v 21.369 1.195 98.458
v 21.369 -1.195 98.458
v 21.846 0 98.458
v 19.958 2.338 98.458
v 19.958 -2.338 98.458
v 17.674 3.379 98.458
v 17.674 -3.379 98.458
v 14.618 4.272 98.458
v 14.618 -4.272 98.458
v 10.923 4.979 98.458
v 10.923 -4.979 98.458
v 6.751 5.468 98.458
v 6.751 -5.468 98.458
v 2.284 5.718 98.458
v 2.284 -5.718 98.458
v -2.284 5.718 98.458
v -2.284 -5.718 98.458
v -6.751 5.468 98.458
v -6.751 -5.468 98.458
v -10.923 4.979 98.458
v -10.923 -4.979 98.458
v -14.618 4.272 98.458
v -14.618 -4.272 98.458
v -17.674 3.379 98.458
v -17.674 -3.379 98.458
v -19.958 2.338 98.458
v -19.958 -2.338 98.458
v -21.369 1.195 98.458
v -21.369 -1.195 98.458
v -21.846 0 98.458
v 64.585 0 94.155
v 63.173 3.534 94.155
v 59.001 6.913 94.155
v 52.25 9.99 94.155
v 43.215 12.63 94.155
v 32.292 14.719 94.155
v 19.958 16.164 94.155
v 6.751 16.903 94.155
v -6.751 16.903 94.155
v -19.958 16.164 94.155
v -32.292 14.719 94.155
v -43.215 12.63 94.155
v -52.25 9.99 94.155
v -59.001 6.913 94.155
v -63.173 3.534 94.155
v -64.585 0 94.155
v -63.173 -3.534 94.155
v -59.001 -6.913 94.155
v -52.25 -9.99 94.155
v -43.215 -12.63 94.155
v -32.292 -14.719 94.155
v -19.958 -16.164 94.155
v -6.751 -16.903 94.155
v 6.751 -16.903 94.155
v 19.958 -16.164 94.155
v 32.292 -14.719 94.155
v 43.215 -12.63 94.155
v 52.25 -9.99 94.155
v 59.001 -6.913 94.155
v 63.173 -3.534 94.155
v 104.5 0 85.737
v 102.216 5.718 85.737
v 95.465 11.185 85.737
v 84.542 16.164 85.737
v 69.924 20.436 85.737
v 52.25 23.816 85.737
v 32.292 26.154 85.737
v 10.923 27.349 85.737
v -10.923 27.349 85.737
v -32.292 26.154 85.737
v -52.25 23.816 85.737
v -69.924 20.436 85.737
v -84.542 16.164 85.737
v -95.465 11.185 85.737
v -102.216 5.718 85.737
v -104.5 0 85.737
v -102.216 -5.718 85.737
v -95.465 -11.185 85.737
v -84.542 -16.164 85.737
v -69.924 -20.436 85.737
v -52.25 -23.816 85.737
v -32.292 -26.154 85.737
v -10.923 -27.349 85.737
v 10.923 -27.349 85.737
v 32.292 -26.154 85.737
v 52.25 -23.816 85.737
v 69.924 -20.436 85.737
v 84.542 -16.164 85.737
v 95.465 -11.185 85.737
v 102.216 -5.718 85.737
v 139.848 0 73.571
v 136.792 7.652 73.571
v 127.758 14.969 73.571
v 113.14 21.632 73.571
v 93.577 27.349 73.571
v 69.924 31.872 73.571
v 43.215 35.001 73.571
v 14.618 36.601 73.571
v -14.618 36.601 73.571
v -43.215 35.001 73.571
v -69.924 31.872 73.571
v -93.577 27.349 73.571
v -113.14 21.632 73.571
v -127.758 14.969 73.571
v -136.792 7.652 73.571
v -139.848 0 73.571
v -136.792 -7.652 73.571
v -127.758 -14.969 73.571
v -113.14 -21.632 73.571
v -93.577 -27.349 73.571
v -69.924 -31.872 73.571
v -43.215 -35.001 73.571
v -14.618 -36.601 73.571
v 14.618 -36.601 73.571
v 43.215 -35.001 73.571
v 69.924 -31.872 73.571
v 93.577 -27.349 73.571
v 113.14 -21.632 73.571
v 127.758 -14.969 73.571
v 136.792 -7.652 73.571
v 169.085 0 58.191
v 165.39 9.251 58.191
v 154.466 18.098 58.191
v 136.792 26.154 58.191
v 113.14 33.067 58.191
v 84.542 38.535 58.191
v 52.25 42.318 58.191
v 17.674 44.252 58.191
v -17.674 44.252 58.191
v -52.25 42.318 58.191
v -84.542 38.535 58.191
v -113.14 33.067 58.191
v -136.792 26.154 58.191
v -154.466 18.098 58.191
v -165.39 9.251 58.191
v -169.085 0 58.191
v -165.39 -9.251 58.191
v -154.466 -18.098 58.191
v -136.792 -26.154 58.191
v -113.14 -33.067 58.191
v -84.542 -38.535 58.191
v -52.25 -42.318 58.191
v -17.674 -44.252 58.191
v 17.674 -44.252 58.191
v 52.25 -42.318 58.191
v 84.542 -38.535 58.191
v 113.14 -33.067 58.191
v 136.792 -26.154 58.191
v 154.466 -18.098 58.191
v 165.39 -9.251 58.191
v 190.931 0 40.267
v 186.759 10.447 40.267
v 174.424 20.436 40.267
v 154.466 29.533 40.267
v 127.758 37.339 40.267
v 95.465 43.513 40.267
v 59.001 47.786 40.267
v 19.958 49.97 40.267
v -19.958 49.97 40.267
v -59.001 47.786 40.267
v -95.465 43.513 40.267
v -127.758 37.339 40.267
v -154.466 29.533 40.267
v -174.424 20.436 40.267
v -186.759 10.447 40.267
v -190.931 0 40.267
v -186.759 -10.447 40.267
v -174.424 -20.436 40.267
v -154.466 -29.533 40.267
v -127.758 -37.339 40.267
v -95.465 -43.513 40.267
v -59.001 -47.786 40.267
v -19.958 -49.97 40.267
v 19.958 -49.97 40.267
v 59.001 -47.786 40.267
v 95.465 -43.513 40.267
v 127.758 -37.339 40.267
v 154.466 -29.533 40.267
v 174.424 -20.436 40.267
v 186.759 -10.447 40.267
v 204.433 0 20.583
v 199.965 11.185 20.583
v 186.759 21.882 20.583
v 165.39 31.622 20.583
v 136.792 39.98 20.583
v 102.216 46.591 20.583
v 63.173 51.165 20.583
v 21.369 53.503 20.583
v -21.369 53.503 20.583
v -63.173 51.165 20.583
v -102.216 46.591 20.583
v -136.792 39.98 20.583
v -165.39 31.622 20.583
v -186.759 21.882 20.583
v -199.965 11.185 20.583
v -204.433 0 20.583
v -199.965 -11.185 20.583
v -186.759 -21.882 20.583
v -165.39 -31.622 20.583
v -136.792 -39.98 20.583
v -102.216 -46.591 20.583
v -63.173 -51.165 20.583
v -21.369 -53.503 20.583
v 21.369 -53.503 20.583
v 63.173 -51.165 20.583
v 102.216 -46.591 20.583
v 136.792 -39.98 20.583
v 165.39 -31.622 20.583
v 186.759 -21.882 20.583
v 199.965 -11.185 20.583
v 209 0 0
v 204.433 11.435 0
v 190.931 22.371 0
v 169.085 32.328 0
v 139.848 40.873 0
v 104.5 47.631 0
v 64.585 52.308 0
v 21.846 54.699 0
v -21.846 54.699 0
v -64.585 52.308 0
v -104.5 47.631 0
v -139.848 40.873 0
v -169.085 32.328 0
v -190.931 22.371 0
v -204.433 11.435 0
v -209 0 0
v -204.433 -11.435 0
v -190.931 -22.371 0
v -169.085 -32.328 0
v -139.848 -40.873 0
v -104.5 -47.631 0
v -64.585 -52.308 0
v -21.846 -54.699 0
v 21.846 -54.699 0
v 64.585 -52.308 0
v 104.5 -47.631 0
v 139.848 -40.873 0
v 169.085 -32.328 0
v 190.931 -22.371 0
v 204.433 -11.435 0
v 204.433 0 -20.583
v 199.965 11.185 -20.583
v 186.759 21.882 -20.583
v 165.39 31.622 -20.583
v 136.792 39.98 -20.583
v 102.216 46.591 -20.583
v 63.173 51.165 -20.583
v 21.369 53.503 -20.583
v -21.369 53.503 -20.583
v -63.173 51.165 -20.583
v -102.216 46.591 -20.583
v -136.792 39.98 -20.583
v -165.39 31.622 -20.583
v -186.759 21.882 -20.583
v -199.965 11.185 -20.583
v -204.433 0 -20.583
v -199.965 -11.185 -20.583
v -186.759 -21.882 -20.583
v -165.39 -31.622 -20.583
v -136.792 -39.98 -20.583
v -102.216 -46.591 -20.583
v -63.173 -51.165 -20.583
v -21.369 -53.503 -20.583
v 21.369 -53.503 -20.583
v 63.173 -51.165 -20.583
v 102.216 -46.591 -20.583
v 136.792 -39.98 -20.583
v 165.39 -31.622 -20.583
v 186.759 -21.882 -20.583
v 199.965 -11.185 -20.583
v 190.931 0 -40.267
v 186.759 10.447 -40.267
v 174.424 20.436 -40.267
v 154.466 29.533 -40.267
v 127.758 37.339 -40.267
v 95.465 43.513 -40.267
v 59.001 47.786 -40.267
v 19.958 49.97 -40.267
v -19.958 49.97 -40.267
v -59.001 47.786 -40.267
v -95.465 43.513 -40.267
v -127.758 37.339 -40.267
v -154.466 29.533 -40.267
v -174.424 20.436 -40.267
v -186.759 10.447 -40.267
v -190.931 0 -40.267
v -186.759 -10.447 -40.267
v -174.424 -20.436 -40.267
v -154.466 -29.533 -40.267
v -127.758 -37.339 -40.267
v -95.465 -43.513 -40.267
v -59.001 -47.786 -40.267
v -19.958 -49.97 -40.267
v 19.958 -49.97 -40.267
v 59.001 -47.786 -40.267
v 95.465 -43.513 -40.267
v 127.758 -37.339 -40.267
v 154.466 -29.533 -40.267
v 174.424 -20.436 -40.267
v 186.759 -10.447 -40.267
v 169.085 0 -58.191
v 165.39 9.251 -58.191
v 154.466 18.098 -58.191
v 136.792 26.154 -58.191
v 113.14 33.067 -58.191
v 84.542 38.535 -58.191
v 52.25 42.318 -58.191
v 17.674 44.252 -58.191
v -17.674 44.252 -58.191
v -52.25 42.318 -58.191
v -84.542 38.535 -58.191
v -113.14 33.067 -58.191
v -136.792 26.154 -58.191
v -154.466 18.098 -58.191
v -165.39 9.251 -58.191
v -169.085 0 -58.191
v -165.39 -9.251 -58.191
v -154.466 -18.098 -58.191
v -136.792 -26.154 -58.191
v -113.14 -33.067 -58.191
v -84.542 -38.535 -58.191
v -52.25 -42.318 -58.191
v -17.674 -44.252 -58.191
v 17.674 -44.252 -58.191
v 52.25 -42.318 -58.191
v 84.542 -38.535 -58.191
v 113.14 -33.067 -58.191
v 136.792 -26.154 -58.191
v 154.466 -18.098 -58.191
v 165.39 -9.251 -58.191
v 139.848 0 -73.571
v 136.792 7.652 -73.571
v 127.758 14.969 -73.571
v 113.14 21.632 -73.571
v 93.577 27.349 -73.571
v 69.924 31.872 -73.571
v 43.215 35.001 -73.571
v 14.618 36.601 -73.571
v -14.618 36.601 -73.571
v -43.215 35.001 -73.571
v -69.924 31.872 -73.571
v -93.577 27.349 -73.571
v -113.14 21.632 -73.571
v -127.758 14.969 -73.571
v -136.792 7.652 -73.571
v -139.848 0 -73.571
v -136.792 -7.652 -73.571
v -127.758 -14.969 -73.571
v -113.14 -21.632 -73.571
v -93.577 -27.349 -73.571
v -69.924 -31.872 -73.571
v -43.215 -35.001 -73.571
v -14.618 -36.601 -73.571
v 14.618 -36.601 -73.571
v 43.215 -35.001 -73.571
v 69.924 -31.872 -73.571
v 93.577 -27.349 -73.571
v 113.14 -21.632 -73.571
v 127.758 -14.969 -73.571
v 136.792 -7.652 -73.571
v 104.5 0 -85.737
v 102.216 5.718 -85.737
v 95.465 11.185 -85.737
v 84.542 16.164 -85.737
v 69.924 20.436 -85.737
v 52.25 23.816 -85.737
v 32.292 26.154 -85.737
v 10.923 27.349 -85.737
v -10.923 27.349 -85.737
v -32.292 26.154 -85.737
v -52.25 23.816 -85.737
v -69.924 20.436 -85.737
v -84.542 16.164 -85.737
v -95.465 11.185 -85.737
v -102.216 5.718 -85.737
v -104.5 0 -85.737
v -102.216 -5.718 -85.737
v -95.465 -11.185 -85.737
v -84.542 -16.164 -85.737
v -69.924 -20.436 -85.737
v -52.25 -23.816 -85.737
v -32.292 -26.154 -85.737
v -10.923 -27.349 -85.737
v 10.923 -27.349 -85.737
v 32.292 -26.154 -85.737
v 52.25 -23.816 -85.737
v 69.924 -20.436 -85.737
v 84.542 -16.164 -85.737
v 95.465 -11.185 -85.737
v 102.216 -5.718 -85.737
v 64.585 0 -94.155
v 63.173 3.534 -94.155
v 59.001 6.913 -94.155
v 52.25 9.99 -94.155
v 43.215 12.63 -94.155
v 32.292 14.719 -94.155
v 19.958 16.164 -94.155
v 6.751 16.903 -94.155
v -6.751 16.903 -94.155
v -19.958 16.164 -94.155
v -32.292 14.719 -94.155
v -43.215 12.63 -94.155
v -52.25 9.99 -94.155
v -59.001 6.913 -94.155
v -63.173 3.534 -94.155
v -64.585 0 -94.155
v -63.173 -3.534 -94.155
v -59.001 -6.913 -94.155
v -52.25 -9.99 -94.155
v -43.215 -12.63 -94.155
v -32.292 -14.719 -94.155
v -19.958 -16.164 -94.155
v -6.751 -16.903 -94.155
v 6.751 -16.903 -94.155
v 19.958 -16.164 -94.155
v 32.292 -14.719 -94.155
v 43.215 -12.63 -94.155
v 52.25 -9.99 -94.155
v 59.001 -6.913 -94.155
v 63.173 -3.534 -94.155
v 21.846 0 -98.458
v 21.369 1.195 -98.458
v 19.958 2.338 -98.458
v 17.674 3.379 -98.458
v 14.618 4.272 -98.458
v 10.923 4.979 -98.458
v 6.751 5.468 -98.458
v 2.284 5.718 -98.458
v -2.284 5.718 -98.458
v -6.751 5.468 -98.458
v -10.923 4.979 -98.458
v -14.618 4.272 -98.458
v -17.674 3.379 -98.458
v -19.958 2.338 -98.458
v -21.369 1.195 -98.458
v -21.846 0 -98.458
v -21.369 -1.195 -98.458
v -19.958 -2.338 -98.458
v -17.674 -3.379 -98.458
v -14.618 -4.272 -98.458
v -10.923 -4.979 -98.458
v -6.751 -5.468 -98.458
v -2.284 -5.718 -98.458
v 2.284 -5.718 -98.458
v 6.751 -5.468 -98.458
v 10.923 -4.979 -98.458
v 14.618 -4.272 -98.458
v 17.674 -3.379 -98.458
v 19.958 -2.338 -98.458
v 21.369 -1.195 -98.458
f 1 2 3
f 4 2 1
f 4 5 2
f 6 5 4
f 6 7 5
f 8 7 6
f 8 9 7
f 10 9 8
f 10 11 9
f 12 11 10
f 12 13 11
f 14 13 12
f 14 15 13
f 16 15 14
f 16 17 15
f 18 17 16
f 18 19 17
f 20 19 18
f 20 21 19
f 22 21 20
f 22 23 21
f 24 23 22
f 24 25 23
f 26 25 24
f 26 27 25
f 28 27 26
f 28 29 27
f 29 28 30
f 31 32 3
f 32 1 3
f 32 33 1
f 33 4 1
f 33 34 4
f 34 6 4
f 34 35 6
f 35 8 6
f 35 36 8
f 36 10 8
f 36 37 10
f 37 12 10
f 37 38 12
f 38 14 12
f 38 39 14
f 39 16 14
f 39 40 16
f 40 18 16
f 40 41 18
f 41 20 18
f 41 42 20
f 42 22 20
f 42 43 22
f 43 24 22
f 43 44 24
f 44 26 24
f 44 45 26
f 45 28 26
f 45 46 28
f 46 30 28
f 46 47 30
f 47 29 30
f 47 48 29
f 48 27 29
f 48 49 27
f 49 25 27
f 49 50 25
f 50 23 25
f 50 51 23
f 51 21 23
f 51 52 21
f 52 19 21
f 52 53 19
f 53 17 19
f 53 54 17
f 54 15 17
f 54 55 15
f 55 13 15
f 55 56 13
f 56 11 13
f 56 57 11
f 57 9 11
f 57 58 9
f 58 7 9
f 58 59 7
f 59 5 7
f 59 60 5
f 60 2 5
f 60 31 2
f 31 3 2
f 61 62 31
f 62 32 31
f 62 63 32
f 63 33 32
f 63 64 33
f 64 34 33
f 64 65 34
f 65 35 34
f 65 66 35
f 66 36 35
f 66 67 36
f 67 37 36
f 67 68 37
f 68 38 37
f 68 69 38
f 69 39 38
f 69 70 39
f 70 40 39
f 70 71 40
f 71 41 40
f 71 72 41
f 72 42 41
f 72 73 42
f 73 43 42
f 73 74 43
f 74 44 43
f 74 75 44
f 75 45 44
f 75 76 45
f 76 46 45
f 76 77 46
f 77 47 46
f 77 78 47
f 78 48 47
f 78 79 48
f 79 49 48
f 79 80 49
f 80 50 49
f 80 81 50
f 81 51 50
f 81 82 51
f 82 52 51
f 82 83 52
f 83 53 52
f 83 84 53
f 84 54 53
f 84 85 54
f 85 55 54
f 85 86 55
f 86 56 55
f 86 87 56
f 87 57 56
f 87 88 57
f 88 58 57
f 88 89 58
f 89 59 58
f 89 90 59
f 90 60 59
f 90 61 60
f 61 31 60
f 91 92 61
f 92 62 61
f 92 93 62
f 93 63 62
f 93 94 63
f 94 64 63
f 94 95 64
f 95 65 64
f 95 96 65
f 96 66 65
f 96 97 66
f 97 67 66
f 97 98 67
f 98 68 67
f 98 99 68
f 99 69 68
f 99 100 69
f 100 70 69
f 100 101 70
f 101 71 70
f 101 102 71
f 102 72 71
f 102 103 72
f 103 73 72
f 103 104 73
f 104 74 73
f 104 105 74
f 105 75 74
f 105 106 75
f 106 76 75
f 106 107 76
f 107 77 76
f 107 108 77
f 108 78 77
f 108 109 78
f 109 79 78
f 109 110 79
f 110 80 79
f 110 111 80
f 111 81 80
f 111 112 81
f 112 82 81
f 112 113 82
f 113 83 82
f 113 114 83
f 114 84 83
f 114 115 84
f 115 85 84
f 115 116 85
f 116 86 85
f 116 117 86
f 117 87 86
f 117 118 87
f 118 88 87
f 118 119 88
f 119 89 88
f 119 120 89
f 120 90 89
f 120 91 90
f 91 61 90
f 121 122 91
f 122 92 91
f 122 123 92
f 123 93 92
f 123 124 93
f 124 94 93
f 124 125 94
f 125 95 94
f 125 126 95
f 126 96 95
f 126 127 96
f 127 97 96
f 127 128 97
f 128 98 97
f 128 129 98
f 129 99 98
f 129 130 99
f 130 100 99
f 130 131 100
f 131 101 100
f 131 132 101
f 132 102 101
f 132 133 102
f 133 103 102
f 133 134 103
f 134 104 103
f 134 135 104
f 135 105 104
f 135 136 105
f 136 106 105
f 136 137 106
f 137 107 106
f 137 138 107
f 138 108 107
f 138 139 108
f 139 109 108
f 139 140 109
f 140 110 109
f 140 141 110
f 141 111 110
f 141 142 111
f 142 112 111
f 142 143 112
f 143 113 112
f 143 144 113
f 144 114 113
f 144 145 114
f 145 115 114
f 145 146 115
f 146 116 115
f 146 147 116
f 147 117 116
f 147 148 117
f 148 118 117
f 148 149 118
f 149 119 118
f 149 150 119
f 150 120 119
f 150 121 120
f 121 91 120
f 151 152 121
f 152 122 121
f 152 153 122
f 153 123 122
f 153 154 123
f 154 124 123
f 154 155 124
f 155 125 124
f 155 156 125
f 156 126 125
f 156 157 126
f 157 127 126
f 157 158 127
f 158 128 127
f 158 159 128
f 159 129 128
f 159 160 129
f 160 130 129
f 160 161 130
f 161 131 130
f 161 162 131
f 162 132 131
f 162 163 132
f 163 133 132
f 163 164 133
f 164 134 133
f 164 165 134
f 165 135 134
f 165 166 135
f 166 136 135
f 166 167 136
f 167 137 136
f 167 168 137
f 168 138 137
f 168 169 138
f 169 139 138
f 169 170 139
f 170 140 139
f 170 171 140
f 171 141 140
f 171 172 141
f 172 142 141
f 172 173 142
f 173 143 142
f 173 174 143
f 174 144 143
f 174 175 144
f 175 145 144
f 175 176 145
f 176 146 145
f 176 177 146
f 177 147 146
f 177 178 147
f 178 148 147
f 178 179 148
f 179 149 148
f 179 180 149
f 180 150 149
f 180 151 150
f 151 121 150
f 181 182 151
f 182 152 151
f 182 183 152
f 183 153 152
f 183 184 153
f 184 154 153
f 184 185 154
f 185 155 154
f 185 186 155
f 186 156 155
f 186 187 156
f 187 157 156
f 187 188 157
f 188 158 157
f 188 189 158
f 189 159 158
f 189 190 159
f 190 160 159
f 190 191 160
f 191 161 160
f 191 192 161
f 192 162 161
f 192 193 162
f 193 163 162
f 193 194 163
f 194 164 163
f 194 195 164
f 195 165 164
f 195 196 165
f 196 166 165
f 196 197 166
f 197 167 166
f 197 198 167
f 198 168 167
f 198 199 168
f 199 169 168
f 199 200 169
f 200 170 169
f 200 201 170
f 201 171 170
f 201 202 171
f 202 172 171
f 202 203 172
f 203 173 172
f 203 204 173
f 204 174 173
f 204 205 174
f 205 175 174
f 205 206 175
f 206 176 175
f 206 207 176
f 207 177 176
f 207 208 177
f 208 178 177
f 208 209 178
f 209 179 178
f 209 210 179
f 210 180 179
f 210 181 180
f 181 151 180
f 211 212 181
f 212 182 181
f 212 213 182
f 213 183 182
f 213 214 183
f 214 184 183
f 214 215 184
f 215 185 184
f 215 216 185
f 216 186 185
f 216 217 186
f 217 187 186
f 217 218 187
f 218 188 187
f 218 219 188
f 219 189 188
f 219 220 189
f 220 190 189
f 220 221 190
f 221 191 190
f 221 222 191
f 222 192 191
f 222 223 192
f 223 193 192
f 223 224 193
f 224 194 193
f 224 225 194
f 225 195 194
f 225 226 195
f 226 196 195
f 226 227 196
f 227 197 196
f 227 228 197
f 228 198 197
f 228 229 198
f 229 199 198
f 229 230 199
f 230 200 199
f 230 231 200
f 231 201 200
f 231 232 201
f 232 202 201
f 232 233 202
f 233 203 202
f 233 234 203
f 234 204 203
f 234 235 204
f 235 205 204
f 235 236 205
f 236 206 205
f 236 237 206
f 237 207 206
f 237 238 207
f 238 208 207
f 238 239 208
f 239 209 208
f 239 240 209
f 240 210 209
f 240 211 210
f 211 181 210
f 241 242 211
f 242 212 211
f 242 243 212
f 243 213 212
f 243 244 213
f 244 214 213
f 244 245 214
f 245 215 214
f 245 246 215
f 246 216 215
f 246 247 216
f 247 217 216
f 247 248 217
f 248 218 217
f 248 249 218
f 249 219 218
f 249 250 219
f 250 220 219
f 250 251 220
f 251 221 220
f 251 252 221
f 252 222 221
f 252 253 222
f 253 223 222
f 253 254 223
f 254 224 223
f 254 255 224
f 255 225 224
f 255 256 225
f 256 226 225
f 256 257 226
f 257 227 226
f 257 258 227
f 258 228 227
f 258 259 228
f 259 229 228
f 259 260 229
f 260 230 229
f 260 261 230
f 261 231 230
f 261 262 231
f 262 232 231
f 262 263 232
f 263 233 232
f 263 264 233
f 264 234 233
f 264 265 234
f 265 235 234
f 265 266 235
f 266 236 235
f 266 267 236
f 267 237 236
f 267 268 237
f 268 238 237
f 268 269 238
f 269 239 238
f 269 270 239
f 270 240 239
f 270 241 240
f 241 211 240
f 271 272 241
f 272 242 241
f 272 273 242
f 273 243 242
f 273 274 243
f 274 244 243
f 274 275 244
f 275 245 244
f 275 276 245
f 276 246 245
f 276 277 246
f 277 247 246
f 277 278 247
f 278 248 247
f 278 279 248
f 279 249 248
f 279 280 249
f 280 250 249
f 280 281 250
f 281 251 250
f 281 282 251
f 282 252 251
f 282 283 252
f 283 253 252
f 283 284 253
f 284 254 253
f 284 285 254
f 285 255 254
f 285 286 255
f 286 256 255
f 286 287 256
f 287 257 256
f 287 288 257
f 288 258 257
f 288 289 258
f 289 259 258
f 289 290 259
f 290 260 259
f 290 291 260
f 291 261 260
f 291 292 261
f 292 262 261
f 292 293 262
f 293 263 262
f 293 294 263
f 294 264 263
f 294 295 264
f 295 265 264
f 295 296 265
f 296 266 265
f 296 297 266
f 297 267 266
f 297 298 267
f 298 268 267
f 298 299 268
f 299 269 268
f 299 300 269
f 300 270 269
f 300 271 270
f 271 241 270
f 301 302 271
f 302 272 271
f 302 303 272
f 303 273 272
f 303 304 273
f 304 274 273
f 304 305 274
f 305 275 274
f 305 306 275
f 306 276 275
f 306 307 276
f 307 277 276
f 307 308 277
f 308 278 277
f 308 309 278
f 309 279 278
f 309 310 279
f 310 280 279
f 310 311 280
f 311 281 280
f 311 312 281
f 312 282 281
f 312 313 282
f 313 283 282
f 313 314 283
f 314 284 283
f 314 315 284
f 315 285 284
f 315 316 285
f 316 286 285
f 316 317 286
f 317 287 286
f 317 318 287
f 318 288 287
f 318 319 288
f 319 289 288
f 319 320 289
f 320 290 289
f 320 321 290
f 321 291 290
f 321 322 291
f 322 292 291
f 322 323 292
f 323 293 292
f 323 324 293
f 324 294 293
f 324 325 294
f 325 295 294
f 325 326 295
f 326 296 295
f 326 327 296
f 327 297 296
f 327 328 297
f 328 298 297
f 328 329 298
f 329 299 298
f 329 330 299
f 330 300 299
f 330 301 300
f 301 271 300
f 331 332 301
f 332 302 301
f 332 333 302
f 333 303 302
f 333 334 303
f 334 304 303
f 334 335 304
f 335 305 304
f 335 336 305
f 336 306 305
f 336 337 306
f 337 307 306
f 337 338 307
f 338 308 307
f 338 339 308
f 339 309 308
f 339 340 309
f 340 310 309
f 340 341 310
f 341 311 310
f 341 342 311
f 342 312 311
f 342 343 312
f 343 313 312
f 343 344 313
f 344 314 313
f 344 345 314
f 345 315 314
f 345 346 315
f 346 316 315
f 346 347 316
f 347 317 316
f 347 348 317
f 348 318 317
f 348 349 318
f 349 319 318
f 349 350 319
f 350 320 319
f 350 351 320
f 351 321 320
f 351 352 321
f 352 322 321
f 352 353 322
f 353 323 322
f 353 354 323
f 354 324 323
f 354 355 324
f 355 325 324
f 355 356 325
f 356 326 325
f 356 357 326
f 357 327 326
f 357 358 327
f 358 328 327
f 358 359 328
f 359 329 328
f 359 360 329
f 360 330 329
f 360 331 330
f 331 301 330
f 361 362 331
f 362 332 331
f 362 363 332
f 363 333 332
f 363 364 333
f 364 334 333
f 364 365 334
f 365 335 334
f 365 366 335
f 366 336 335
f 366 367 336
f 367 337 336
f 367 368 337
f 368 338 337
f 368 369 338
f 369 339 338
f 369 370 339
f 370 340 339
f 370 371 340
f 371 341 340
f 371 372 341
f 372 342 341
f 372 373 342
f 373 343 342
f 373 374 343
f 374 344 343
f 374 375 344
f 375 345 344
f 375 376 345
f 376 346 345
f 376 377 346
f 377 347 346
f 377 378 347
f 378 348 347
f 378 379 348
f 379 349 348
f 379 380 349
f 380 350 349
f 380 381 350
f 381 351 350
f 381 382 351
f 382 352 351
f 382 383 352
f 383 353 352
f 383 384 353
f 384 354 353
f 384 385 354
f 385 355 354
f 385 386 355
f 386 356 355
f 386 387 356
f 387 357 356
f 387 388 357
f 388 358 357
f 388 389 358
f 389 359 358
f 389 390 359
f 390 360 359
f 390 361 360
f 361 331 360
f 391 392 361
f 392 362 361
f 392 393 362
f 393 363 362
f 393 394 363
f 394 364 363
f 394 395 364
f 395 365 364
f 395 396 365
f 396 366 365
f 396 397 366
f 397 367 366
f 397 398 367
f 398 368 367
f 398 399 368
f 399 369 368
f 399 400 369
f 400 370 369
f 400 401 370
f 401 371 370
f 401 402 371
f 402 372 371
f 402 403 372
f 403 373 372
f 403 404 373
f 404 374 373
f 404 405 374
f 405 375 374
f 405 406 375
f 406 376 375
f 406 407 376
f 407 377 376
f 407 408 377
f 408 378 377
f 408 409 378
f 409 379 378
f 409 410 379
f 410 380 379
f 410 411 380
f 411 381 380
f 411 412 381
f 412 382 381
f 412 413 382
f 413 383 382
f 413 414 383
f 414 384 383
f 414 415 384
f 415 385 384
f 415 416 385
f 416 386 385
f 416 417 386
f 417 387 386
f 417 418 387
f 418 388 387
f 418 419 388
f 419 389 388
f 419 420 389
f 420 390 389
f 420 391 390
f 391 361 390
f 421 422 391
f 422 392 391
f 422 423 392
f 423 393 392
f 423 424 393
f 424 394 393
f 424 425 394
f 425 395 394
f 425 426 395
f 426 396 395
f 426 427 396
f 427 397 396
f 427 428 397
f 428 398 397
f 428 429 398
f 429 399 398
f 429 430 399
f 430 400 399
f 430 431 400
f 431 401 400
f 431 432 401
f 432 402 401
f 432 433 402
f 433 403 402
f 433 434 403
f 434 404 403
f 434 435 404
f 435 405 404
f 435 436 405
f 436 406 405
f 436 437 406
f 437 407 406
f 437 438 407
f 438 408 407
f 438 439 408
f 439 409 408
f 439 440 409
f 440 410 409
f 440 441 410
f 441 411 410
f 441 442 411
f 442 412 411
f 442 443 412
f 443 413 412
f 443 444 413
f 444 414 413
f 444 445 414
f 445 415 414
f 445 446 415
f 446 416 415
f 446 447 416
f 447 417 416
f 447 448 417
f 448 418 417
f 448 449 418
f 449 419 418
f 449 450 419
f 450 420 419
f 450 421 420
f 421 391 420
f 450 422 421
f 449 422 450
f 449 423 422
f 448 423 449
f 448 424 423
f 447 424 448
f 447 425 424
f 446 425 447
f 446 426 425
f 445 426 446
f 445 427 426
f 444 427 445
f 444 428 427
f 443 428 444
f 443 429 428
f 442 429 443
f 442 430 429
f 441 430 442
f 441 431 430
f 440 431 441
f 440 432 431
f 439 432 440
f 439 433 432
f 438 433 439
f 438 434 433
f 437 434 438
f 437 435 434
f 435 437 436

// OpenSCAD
// Generated by SolidPython 1.0.1 on 2020-07-29 00:46:53


scale(v = [19, 5, 9]) {
	sphere(r = 11);
}
/***********************************************
*********      SolidPython code:      **********
************************************************
 
# import packages: SolidPython
from solid import *
from solid.utils import *
from itertools import chain, combinations, permutations


class Resize:

    def __init__(self, scad_file):
        self.scad_file = scad_file
        #self.scad_file = import_scad(scad_file)
        # cone/cylinder param:
        self.r1 = 0
        self.r2 = 0
        self.h = 0
        # rectangular prism param:
        self.w = 0
        self.l = 0
        # ellipse param:
        self.r = 0

    # import OpenScad code (file name corresponds to shape)


    # classify shape + parameters
    def assign(self, param1, param2, param3):
        if self.scad_file == 'cone.scad':
            self.r1 = param1
            self.r2 = param2
            self.h = param3
        elif self.scad_file == 'cylinder.scad':
            self.r1 = param1
            self.r2 = param2
            self.h = param3
        elif self.scad_file == 'rectangularPrism.scad':
            self.h = param1
            self.l = param2
            self.w = param3
        else:
            self.r = param1
            self.h = param2

    # resize parameters
    def iterate(self):
        x = range(3, 20, 2)
        i = 1
        if self.scad_file == 'cone.scad':
            tempList = list(permutations(x, 2))
            for temp in tempList:
                param1 = temp[0]
                param2 = temp[1]
                filepath = 'produced_scad_files/' + 'cone' + str(param1) + '_' + str(param2) + '_' + '.scad'
                scad_render_to_file(cylinder(h=param1, r1=param2, r2=0), filepath)

        elif self.scad_file == 'cylinder.scad':
            tempList = list(permutations(x, 3))
            for temp in tempList:
                param1 = temp[0]
                param2 = temp[1]
                filepath = 'produced_scad_files/' + 'cylinder' + str(param1) + '_' + str(param2) + '_' + '.scad'
                scad_render_to_file(cylinder(h=param1, r1=param2, r2=param2), filepath)

        elif self.scad_file == 'rectangularPrism.scad':
            tempList = list(permutations(x, 3))
            for temp in tempList:
                param1 = temp[0]
                param2 = temp[1]
                param3 = temp[2]
                filepath = 'produced_scad_files/' + 'rectangularPrism' + str(param1) + '_' + str(param2) + '_' + str(
                    param3) + '.scad'
                scad_render_to_file(cube(size=(param1, param2, param3)), filepath)

        elif self.scad_file == 'ellipse.scad':
            tempList = list(permutations(x, 4))
            for temp in tempList:
                param1 = temp[0]
                param2 = temp[1]
                param3 = temp[2]
                param4 = temp[3]
                filepath = 'produced_scad_files/' + 'ellipse' + str(param1) + '_' + str(param2) + '_' + str(param3) + '_' + str(param4) + '.scad'
                scad_render_to_file(scale([param1, param2, param3])(sphere(r=param4)), filepath)

    def render_to_scadfile(self):
        scad_render_to_file(scad, 'example.scad') 
 
************************************************/
